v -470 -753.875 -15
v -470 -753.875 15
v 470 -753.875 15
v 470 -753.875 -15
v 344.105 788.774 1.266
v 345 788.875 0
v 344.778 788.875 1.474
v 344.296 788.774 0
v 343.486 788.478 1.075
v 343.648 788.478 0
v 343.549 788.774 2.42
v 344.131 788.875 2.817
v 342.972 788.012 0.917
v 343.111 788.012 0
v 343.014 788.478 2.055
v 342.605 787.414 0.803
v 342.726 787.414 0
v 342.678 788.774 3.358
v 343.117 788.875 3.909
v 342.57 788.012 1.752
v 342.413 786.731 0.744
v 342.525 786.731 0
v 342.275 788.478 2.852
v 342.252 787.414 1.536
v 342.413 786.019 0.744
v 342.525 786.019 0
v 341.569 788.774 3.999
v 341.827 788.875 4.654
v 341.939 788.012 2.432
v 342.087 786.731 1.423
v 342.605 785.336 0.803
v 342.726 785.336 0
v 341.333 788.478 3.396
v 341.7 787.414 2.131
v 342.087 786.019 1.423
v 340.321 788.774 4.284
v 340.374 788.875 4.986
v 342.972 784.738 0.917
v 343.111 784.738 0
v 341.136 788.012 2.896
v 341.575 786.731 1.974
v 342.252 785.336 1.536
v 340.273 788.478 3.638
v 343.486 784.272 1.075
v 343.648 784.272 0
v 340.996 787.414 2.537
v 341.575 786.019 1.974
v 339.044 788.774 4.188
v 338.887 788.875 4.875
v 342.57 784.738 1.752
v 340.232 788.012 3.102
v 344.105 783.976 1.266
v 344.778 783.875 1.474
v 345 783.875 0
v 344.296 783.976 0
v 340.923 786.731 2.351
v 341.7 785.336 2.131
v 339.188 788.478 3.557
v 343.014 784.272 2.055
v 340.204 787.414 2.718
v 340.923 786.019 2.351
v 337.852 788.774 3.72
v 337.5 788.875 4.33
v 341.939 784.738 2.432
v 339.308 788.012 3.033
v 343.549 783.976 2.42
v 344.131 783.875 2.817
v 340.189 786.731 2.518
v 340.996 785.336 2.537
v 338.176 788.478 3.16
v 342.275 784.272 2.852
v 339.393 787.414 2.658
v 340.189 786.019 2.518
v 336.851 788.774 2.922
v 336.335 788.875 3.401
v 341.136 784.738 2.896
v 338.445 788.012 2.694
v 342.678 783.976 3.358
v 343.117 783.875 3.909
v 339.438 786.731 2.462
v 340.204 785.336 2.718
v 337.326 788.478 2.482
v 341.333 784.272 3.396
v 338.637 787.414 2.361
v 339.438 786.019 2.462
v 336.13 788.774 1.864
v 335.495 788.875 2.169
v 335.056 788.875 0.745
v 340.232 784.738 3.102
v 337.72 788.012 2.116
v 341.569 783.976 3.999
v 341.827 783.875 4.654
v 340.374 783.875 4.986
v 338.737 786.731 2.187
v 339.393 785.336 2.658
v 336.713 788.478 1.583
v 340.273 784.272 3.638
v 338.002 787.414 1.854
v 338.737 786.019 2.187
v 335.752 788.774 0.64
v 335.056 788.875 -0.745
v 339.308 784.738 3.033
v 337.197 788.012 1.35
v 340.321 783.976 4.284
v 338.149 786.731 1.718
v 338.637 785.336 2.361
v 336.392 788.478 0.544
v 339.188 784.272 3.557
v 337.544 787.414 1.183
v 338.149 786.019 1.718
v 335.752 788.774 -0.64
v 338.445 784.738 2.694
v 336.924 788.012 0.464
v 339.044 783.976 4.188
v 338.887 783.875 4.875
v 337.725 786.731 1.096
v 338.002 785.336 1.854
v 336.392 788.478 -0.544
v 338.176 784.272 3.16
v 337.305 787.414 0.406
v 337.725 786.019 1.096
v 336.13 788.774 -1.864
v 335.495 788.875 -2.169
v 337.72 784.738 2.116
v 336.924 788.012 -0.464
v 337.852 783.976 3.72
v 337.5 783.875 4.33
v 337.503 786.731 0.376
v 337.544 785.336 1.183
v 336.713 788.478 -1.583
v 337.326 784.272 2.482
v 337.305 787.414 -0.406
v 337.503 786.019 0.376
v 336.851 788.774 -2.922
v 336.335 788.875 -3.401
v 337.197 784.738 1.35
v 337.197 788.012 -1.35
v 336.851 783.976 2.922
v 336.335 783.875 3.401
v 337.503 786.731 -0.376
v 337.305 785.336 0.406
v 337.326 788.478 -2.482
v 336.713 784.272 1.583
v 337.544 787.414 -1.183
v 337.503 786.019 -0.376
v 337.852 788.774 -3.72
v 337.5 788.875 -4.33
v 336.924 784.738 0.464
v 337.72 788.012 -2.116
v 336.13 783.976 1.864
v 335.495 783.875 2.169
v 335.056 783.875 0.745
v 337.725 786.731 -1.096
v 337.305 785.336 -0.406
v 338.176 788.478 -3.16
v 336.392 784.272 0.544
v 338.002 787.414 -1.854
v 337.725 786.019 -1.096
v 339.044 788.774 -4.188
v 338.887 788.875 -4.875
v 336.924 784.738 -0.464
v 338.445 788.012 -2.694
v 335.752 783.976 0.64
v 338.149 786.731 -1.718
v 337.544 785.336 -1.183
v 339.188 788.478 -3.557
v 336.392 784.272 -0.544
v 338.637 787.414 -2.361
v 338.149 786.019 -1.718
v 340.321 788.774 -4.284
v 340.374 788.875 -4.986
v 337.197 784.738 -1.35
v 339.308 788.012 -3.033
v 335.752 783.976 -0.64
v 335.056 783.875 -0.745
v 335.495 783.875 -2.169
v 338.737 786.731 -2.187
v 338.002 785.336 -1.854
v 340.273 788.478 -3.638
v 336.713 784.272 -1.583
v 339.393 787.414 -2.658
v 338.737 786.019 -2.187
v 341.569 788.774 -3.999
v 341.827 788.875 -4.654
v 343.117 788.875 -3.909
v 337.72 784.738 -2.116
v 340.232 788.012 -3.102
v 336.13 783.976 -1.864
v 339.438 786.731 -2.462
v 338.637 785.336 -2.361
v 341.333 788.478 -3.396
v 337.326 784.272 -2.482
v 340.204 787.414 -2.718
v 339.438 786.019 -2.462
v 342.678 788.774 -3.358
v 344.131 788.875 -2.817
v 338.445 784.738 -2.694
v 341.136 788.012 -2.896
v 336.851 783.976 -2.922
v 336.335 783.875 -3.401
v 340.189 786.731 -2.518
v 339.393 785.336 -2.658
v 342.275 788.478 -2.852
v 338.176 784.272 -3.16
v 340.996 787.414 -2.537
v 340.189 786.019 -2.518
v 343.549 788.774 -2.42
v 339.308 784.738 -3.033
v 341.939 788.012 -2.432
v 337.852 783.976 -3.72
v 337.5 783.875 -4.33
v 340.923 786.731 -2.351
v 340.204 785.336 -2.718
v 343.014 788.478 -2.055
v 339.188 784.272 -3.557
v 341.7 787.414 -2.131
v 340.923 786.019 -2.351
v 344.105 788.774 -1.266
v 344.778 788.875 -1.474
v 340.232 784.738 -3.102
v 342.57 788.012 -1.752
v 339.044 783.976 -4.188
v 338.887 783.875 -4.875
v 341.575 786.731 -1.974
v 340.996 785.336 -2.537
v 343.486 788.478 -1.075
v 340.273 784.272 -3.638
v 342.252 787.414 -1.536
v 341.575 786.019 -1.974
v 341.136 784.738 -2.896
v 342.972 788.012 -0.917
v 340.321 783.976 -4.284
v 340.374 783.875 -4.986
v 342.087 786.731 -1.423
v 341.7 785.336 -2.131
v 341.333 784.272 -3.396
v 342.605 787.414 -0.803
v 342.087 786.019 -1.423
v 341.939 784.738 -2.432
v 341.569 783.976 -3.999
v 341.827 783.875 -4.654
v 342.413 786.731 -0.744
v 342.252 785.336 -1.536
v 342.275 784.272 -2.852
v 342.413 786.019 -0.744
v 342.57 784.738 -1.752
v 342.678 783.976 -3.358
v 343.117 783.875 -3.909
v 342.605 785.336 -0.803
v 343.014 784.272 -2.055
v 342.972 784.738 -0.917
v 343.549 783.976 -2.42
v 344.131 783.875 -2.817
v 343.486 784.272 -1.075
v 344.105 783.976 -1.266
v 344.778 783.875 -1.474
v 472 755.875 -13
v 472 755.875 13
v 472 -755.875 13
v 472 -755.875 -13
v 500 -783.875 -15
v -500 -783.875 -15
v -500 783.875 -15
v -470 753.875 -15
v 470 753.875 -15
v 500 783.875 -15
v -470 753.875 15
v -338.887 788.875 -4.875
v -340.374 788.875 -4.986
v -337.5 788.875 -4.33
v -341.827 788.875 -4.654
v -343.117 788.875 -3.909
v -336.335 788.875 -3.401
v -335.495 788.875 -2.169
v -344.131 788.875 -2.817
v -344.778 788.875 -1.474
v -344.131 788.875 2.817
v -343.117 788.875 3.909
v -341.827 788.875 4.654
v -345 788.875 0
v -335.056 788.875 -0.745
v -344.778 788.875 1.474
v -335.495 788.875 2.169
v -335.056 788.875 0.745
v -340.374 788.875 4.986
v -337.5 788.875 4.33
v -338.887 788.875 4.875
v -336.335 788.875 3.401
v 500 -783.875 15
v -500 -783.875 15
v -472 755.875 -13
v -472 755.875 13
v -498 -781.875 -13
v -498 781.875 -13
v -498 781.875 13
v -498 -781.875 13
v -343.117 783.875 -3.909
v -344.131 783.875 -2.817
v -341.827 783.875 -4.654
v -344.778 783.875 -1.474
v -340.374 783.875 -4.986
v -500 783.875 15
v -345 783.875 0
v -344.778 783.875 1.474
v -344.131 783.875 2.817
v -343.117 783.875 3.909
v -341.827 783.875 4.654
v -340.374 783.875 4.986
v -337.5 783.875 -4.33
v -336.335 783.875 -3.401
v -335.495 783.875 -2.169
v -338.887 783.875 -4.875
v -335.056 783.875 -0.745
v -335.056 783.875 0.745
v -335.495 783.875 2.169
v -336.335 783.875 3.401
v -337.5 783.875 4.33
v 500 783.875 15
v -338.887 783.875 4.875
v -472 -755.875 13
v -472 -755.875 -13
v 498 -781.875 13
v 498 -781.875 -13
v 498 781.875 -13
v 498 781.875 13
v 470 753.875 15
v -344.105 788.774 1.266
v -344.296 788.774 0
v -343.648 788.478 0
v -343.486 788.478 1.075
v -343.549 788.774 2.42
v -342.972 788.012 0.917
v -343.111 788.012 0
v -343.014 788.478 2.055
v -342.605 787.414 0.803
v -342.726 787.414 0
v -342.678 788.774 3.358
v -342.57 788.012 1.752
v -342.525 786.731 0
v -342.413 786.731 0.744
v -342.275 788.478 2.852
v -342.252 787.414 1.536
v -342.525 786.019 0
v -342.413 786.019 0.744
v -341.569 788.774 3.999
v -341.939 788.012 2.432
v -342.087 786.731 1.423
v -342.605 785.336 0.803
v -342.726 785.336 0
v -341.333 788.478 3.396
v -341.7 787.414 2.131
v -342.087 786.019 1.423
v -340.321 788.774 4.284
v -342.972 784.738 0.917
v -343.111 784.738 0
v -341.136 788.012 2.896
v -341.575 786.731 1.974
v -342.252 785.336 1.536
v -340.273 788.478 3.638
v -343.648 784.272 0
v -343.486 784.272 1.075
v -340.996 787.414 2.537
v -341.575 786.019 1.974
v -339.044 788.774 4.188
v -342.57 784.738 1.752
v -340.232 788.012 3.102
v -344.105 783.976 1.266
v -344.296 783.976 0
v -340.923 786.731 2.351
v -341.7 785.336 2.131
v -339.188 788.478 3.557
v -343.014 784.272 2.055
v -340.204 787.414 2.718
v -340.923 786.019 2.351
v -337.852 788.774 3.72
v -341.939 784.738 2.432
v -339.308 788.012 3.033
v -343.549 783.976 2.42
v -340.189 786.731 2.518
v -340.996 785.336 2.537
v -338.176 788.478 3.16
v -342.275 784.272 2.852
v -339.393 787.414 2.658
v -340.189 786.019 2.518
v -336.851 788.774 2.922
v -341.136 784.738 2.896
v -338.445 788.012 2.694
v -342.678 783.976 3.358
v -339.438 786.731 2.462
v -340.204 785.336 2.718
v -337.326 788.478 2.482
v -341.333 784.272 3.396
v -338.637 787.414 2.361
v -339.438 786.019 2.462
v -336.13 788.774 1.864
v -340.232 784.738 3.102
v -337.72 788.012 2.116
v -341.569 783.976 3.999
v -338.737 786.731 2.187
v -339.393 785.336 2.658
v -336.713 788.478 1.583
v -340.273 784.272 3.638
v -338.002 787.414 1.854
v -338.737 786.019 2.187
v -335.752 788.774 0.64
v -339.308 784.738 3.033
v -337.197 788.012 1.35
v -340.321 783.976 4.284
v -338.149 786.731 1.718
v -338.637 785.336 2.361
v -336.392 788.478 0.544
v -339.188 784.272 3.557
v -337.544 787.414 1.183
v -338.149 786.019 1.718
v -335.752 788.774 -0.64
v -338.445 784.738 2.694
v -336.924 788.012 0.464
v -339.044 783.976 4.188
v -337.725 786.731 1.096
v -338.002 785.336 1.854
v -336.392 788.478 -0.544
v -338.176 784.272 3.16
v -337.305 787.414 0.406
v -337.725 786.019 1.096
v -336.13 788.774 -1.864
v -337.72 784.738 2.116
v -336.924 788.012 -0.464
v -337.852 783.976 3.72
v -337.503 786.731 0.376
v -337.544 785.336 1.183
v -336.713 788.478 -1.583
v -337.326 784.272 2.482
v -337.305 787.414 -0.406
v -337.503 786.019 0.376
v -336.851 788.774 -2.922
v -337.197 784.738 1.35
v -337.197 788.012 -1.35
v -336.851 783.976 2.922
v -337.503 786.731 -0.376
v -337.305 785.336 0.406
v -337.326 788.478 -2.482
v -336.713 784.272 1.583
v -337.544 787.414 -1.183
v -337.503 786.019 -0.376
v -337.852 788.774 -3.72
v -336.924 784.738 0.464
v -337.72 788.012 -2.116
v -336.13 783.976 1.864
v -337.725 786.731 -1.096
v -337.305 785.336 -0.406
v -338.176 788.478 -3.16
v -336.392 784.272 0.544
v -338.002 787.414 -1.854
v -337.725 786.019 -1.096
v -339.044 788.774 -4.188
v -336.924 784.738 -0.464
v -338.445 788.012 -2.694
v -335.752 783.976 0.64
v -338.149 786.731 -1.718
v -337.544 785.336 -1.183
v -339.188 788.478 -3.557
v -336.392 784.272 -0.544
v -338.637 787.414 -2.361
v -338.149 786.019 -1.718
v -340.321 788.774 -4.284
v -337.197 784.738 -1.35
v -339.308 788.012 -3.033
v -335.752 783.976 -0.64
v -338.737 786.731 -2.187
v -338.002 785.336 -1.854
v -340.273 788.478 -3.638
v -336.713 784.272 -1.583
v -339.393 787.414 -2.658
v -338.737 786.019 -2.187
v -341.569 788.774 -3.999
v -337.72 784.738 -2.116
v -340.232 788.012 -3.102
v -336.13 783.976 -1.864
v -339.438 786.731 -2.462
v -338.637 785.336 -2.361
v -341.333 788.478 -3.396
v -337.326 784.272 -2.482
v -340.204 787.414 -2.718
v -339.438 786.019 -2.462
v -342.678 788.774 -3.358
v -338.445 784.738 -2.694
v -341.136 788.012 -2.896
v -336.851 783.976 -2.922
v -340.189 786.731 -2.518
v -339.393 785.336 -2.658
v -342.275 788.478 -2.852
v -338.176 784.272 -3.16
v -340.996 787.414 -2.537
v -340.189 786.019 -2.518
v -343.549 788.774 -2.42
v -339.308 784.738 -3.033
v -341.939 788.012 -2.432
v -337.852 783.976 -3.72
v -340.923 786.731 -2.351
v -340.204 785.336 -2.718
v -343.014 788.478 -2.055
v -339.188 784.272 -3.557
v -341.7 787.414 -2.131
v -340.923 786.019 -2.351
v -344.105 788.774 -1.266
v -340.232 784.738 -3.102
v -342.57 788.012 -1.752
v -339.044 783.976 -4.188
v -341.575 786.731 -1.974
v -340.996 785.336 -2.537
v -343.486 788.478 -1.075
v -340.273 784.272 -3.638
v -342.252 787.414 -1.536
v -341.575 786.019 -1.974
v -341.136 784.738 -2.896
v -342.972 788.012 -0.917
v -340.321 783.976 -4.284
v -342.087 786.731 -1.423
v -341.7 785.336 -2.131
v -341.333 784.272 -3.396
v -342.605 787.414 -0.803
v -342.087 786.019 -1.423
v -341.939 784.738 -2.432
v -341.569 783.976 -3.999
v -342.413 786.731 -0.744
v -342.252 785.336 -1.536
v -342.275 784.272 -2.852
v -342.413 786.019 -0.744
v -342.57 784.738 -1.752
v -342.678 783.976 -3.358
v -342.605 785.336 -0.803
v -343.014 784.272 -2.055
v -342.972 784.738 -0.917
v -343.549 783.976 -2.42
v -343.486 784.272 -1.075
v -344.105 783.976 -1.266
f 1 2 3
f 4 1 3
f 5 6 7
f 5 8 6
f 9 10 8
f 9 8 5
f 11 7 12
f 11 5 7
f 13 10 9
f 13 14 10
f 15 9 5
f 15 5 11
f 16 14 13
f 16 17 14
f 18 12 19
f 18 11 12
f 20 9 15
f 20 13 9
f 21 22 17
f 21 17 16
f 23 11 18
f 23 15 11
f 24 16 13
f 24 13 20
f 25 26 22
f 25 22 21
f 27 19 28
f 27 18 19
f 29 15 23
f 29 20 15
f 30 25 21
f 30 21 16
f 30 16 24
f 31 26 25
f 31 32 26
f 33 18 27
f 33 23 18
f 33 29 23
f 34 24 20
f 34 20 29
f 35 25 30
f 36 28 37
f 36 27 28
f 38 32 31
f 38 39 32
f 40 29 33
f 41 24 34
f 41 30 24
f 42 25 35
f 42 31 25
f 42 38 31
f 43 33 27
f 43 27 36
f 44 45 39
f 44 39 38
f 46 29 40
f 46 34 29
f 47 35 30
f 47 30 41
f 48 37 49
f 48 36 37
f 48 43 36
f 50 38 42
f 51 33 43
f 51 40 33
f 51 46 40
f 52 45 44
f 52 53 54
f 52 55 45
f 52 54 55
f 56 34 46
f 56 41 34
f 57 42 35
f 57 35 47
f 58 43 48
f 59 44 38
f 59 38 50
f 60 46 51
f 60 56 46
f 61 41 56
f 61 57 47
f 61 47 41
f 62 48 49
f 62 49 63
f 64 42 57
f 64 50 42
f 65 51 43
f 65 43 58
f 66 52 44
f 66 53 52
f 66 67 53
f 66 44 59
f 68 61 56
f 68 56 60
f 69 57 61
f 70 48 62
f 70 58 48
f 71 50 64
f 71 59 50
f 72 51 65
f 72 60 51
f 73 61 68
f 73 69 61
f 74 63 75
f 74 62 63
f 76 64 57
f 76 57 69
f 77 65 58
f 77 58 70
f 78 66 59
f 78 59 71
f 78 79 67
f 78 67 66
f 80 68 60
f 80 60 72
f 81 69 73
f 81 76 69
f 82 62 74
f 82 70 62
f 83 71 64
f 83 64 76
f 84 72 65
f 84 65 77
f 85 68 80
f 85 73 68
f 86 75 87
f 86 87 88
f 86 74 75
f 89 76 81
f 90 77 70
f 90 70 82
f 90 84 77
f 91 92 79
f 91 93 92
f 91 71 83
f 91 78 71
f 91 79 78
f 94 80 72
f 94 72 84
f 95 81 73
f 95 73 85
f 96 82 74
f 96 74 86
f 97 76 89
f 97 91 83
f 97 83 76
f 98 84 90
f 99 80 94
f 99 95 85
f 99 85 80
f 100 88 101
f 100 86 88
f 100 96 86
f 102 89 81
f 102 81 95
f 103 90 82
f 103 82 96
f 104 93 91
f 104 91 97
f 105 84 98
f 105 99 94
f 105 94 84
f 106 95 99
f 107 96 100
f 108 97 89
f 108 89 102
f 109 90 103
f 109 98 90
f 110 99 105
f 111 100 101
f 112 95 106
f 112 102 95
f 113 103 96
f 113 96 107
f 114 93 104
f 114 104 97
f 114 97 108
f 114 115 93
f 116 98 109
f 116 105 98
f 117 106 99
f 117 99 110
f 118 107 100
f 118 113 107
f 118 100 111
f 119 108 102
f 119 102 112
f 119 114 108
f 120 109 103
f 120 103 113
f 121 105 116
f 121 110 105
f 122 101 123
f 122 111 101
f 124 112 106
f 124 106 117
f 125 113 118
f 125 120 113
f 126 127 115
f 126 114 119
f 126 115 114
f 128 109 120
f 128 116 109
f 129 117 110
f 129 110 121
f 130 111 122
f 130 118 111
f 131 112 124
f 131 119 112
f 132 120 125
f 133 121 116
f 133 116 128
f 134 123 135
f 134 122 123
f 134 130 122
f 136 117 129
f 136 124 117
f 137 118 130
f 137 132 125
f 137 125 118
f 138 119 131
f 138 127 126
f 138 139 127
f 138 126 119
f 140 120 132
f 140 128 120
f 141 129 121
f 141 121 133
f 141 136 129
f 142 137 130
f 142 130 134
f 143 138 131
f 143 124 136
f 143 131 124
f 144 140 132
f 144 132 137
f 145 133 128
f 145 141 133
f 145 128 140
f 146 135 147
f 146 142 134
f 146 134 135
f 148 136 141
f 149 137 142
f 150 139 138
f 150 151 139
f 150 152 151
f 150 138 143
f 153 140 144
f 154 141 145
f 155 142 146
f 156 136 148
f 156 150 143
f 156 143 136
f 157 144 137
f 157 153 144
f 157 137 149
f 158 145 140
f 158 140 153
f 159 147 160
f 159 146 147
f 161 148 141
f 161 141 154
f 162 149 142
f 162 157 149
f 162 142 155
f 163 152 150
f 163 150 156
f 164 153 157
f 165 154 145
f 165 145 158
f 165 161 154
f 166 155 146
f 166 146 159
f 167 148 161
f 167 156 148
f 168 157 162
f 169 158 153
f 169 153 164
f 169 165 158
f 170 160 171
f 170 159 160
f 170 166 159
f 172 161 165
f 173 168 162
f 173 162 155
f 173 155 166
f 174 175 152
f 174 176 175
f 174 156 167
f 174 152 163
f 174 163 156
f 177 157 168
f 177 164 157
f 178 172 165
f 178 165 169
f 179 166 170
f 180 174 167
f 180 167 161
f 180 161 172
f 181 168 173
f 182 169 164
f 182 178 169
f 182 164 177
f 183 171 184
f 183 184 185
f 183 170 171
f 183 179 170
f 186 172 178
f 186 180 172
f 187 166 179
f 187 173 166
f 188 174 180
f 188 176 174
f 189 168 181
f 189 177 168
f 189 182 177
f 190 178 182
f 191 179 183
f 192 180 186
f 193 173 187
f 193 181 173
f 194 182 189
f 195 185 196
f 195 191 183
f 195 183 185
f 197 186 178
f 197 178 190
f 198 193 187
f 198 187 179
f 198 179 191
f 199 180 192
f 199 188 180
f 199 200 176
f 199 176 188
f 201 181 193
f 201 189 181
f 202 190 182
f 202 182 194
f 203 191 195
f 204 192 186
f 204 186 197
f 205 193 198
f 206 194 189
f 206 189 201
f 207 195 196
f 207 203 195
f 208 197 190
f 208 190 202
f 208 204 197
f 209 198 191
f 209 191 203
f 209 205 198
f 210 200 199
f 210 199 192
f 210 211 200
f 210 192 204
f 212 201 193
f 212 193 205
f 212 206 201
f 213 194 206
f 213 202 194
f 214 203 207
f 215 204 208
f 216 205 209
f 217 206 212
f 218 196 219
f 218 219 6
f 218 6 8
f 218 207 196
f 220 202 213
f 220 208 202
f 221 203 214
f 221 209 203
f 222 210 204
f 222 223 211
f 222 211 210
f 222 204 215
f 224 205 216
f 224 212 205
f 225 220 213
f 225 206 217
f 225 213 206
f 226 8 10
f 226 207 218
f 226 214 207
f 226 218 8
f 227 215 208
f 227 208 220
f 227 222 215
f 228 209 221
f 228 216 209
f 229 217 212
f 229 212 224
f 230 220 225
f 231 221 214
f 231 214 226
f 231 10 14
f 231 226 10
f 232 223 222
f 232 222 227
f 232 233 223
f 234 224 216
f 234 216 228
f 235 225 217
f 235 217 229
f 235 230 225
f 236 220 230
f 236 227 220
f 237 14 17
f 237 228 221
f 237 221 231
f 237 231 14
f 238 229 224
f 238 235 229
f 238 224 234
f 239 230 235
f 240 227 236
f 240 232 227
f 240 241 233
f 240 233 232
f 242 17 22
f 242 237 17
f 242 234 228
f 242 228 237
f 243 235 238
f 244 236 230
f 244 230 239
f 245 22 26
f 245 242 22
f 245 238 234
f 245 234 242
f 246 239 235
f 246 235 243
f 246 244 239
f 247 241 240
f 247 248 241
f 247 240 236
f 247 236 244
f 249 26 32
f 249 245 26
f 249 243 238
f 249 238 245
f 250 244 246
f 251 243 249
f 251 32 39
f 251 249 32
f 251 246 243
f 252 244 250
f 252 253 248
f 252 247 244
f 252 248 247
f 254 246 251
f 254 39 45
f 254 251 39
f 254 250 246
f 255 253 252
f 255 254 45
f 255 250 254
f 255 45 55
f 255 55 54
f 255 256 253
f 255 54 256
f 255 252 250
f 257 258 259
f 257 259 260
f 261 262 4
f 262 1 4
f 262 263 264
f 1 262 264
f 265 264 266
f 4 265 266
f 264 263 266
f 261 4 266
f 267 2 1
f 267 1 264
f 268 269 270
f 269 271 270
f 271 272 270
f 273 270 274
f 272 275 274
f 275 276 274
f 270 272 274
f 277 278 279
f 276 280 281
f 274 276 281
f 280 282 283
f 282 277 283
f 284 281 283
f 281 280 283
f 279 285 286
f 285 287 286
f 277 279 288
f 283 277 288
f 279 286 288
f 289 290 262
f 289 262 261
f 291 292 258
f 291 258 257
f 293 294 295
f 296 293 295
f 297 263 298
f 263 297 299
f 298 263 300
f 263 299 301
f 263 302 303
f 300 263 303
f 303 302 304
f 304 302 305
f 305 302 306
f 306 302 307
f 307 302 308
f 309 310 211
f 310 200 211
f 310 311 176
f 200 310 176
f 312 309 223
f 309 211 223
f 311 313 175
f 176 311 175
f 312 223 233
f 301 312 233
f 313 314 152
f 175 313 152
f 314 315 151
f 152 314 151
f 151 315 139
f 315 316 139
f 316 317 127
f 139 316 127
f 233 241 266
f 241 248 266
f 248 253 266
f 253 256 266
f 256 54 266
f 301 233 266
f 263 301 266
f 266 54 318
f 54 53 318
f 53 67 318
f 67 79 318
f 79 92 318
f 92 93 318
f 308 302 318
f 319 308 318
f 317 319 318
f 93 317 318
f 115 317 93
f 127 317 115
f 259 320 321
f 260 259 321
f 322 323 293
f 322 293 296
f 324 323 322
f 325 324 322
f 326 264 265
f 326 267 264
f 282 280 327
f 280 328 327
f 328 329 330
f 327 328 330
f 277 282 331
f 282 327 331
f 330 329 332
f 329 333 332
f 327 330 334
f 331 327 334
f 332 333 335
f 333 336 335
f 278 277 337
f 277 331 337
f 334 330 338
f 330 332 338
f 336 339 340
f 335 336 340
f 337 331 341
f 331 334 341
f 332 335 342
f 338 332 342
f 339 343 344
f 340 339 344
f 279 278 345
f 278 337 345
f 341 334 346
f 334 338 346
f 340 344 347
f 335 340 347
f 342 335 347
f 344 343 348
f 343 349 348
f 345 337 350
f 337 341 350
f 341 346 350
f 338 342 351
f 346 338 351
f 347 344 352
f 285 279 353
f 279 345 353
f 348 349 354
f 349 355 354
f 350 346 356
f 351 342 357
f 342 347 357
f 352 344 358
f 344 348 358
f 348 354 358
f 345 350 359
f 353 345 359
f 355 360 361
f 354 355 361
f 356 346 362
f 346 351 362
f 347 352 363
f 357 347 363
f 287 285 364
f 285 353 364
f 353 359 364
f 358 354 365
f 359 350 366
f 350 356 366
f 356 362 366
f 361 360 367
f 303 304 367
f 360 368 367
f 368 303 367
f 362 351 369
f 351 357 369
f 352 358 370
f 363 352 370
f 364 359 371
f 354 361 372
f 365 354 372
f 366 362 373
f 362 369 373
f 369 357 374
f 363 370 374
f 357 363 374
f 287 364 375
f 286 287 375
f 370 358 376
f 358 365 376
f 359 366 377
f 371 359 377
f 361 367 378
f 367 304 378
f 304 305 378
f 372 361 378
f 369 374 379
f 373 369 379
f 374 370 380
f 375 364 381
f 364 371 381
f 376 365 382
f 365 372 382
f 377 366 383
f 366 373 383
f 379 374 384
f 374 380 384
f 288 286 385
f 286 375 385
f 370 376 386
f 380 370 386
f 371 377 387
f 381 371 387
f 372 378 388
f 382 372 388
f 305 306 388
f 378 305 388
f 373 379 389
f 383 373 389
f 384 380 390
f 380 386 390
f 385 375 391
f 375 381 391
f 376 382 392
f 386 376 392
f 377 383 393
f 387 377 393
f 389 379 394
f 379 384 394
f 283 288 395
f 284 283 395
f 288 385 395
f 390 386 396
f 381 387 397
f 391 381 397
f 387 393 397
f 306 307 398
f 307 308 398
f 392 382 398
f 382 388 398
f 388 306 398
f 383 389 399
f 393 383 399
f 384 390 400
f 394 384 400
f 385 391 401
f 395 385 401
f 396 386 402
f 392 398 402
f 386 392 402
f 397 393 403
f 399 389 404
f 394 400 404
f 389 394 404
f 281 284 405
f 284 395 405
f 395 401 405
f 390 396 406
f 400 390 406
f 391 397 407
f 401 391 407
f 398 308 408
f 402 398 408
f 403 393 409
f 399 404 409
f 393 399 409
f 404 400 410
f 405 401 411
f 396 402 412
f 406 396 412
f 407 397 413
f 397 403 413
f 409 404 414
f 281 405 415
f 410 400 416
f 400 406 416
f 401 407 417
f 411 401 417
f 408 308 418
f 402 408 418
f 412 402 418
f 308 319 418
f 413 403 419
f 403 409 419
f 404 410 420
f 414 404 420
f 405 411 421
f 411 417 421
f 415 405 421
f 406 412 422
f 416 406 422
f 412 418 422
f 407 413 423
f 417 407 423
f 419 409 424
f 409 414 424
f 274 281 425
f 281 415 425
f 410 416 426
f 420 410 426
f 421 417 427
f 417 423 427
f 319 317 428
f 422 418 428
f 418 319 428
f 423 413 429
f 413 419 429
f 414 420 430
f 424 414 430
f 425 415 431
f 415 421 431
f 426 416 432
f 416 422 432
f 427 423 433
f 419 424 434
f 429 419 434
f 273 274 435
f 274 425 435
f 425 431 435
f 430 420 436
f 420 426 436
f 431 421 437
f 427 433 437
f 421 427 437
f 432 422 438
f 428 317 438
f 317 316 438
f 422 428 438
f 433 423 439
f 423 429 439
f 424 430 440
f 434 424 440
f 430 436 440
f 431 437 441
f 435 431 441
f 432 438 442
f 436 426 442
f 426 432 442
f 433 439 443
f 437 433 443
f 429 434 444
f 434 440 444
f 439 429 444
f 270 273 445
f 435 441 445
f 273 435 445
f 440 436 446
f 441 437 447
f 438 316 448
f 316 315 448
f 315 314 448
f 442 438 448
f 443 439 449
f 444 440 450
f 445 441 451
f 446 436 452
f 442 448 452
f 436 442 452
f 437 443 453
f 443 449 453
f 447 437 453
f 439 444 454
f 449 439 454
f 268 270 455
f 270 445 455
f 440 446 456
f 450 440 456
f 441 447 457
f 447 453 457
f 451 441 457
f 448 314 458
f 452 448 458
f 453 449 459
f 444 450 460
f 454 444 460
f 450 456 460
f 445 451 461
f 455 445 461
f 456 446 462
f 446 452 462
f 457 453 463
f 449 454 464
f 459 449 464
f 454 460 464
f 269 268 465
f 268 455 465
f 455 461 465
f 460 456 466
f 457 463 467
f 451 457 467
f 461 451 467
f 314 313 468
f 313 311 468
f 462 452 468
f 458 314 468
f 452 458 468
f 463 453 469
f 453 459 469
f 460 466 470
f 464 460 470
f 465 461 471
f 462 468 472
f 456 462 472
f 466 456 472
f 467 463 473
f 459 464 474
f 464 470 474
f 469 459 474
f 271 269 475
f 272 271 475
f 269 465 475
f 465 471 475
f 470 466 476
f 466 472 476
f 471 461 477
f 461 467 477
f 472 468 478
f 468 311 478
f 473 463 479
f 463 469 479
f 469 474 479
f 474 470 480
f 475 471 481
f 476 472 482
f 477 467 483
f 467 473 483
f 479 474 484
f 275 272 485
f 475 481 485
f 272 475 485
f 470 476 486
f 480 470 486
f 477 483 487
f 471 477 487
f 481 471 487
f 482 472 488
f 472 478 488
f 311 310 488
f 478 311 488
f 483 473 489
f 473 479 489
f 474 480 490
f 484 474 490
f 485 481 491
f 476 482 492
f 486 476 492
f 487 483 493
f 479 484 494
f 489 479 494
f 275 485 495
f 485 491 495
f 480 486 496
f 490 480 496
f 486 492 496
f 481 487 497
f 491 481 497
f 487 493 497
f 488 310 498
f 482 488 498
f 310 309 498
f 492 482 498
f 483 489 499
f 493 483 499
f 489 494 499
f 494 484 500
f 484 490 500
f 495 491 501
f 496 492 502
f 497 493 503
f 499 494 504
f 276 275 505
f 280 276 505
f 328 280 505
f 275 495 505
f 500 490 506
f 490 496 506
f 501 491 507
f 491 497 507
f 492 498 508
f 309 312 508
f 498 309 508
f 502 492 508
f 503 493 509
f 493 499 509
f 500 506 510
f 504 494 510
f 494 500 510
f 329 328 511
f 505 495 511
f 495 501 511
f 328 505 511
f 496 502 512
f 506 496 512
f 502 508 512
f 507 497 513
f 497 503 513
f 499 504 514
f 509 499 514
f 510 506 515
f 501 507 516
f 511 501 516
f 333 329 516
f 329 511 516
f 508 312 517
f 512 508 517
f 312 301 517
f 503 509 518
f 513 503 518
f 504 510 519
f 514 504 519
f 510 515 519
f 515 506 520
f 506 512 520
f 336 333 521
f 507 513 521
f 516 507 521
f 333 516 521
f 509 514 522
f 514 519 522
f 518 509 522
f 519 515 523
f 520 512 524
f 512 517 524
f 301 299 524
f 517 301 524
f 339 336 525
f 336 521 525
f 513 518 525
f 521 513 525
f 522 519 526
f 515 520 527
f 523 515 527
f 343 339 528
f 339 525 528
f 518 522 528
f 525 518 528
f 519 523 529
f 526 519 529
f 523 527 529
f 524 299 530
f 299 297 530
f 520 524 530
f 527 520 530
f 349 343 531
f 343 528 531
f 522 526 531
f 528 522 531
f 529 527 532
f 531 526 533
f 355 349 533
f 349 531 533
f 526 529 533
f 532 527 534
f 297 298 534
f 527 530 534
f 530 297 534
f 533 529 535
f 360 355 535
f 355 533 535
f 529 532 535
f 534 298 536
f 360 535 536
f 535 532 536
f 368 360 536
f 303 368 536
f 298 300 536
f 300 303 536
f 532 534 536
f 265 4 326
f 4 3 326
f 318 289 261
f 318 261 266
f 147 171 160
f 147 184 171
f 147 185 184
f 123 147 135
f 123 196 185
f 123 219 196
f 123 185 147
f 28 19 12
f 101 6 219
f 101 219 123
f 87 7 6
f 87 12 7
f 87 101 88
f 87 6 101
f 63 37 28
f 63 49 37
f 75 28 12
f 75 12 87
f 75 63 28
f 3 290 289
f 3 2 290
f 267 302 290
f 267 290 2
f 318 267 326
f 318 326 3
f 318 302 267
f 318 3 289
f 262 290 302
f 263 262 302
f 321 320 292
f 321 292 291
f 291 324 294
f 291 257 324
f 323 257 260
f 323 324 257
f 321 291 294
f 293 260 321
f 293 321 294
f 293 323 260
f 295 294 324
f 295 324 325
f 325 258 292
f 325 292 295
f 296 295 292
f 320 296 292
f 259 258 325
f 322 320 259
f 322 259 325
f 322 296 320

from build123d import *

# Parameters (mm, degrees)
SKETCH1_W           = 1000
SKETCH1_H           = 1567.75
SKETCH1_W_2         = 940
SKETCH1_H_2         = 1507.75
BOSS_EXTRUDE1_DEPTH = 15
SKETCH2_W           = 26
SKETCH2_H           = 26


with BuildPart() as part:
    # Sketch1 → Boss-Extrude1 (new body, symmetric)
    with BuildSketch(Plane.XY):
        Rectangle(SKETCH1_W, SKETCH1_H)
        Rectangle(SKETCH1_W_2, SKETCH1_H_2, mode=Mode.SUBTRACT)
    extrude(amount=BOSS_EXTRUDE1_DEPTH, both=True)

    # Cut-Sweep1: sweep along a path in Sketch4
    with BuildLine(Plane.XY) as cut_sweep1_path:
        Line((-485, 768.875), (-485, -768.875))
        Line((-485, -768.875), (485, -768.875))
        Line((485, -768.875), (485, 768.875))
        Line((485, 768.875), (-485, 768.875))
    # Sketch2 → Cut-Sweep1 (sweep, cut)
    with BuildSketch(Plane(origin=(0, 0, 0), x_dir=(0, 0, -1), z_dir=(1, 0, 0))):
        with Locations((0, 768.875)):
            Rectangle(SKETCH2_W, SKETCH2_H)
    sweep(path=cut_sweep1_path.line, transition=Transition.RIGHT, mode=Mode.SUBTRACT)

    # Sketch7 → Revolve1 (revolve)
    with BuildSketch(Plane.XY):
        with BuildLine():
            Line((-340, 783.875), (-340, 788.875))
            Line((-340, 788.875), (-345, 788.875))
            ThreePointArc((-345, 788.875), (-342.5, 786.375), (-345, 783.875))
            Line((-345, 783.875), (-340, 783.875))
        make_face()
    revolve1 = revolve(axis=Axis((-340, 795.104340353, 0), (0, 1, 0)))

    # Mirror1: Revolve1 across plane
    add(revolve1.mirror(Plane(origin=(0, 0, 0), x_dir=(0, 0, 1), z_dir=(1, 0, 0))))


solid = part.part
